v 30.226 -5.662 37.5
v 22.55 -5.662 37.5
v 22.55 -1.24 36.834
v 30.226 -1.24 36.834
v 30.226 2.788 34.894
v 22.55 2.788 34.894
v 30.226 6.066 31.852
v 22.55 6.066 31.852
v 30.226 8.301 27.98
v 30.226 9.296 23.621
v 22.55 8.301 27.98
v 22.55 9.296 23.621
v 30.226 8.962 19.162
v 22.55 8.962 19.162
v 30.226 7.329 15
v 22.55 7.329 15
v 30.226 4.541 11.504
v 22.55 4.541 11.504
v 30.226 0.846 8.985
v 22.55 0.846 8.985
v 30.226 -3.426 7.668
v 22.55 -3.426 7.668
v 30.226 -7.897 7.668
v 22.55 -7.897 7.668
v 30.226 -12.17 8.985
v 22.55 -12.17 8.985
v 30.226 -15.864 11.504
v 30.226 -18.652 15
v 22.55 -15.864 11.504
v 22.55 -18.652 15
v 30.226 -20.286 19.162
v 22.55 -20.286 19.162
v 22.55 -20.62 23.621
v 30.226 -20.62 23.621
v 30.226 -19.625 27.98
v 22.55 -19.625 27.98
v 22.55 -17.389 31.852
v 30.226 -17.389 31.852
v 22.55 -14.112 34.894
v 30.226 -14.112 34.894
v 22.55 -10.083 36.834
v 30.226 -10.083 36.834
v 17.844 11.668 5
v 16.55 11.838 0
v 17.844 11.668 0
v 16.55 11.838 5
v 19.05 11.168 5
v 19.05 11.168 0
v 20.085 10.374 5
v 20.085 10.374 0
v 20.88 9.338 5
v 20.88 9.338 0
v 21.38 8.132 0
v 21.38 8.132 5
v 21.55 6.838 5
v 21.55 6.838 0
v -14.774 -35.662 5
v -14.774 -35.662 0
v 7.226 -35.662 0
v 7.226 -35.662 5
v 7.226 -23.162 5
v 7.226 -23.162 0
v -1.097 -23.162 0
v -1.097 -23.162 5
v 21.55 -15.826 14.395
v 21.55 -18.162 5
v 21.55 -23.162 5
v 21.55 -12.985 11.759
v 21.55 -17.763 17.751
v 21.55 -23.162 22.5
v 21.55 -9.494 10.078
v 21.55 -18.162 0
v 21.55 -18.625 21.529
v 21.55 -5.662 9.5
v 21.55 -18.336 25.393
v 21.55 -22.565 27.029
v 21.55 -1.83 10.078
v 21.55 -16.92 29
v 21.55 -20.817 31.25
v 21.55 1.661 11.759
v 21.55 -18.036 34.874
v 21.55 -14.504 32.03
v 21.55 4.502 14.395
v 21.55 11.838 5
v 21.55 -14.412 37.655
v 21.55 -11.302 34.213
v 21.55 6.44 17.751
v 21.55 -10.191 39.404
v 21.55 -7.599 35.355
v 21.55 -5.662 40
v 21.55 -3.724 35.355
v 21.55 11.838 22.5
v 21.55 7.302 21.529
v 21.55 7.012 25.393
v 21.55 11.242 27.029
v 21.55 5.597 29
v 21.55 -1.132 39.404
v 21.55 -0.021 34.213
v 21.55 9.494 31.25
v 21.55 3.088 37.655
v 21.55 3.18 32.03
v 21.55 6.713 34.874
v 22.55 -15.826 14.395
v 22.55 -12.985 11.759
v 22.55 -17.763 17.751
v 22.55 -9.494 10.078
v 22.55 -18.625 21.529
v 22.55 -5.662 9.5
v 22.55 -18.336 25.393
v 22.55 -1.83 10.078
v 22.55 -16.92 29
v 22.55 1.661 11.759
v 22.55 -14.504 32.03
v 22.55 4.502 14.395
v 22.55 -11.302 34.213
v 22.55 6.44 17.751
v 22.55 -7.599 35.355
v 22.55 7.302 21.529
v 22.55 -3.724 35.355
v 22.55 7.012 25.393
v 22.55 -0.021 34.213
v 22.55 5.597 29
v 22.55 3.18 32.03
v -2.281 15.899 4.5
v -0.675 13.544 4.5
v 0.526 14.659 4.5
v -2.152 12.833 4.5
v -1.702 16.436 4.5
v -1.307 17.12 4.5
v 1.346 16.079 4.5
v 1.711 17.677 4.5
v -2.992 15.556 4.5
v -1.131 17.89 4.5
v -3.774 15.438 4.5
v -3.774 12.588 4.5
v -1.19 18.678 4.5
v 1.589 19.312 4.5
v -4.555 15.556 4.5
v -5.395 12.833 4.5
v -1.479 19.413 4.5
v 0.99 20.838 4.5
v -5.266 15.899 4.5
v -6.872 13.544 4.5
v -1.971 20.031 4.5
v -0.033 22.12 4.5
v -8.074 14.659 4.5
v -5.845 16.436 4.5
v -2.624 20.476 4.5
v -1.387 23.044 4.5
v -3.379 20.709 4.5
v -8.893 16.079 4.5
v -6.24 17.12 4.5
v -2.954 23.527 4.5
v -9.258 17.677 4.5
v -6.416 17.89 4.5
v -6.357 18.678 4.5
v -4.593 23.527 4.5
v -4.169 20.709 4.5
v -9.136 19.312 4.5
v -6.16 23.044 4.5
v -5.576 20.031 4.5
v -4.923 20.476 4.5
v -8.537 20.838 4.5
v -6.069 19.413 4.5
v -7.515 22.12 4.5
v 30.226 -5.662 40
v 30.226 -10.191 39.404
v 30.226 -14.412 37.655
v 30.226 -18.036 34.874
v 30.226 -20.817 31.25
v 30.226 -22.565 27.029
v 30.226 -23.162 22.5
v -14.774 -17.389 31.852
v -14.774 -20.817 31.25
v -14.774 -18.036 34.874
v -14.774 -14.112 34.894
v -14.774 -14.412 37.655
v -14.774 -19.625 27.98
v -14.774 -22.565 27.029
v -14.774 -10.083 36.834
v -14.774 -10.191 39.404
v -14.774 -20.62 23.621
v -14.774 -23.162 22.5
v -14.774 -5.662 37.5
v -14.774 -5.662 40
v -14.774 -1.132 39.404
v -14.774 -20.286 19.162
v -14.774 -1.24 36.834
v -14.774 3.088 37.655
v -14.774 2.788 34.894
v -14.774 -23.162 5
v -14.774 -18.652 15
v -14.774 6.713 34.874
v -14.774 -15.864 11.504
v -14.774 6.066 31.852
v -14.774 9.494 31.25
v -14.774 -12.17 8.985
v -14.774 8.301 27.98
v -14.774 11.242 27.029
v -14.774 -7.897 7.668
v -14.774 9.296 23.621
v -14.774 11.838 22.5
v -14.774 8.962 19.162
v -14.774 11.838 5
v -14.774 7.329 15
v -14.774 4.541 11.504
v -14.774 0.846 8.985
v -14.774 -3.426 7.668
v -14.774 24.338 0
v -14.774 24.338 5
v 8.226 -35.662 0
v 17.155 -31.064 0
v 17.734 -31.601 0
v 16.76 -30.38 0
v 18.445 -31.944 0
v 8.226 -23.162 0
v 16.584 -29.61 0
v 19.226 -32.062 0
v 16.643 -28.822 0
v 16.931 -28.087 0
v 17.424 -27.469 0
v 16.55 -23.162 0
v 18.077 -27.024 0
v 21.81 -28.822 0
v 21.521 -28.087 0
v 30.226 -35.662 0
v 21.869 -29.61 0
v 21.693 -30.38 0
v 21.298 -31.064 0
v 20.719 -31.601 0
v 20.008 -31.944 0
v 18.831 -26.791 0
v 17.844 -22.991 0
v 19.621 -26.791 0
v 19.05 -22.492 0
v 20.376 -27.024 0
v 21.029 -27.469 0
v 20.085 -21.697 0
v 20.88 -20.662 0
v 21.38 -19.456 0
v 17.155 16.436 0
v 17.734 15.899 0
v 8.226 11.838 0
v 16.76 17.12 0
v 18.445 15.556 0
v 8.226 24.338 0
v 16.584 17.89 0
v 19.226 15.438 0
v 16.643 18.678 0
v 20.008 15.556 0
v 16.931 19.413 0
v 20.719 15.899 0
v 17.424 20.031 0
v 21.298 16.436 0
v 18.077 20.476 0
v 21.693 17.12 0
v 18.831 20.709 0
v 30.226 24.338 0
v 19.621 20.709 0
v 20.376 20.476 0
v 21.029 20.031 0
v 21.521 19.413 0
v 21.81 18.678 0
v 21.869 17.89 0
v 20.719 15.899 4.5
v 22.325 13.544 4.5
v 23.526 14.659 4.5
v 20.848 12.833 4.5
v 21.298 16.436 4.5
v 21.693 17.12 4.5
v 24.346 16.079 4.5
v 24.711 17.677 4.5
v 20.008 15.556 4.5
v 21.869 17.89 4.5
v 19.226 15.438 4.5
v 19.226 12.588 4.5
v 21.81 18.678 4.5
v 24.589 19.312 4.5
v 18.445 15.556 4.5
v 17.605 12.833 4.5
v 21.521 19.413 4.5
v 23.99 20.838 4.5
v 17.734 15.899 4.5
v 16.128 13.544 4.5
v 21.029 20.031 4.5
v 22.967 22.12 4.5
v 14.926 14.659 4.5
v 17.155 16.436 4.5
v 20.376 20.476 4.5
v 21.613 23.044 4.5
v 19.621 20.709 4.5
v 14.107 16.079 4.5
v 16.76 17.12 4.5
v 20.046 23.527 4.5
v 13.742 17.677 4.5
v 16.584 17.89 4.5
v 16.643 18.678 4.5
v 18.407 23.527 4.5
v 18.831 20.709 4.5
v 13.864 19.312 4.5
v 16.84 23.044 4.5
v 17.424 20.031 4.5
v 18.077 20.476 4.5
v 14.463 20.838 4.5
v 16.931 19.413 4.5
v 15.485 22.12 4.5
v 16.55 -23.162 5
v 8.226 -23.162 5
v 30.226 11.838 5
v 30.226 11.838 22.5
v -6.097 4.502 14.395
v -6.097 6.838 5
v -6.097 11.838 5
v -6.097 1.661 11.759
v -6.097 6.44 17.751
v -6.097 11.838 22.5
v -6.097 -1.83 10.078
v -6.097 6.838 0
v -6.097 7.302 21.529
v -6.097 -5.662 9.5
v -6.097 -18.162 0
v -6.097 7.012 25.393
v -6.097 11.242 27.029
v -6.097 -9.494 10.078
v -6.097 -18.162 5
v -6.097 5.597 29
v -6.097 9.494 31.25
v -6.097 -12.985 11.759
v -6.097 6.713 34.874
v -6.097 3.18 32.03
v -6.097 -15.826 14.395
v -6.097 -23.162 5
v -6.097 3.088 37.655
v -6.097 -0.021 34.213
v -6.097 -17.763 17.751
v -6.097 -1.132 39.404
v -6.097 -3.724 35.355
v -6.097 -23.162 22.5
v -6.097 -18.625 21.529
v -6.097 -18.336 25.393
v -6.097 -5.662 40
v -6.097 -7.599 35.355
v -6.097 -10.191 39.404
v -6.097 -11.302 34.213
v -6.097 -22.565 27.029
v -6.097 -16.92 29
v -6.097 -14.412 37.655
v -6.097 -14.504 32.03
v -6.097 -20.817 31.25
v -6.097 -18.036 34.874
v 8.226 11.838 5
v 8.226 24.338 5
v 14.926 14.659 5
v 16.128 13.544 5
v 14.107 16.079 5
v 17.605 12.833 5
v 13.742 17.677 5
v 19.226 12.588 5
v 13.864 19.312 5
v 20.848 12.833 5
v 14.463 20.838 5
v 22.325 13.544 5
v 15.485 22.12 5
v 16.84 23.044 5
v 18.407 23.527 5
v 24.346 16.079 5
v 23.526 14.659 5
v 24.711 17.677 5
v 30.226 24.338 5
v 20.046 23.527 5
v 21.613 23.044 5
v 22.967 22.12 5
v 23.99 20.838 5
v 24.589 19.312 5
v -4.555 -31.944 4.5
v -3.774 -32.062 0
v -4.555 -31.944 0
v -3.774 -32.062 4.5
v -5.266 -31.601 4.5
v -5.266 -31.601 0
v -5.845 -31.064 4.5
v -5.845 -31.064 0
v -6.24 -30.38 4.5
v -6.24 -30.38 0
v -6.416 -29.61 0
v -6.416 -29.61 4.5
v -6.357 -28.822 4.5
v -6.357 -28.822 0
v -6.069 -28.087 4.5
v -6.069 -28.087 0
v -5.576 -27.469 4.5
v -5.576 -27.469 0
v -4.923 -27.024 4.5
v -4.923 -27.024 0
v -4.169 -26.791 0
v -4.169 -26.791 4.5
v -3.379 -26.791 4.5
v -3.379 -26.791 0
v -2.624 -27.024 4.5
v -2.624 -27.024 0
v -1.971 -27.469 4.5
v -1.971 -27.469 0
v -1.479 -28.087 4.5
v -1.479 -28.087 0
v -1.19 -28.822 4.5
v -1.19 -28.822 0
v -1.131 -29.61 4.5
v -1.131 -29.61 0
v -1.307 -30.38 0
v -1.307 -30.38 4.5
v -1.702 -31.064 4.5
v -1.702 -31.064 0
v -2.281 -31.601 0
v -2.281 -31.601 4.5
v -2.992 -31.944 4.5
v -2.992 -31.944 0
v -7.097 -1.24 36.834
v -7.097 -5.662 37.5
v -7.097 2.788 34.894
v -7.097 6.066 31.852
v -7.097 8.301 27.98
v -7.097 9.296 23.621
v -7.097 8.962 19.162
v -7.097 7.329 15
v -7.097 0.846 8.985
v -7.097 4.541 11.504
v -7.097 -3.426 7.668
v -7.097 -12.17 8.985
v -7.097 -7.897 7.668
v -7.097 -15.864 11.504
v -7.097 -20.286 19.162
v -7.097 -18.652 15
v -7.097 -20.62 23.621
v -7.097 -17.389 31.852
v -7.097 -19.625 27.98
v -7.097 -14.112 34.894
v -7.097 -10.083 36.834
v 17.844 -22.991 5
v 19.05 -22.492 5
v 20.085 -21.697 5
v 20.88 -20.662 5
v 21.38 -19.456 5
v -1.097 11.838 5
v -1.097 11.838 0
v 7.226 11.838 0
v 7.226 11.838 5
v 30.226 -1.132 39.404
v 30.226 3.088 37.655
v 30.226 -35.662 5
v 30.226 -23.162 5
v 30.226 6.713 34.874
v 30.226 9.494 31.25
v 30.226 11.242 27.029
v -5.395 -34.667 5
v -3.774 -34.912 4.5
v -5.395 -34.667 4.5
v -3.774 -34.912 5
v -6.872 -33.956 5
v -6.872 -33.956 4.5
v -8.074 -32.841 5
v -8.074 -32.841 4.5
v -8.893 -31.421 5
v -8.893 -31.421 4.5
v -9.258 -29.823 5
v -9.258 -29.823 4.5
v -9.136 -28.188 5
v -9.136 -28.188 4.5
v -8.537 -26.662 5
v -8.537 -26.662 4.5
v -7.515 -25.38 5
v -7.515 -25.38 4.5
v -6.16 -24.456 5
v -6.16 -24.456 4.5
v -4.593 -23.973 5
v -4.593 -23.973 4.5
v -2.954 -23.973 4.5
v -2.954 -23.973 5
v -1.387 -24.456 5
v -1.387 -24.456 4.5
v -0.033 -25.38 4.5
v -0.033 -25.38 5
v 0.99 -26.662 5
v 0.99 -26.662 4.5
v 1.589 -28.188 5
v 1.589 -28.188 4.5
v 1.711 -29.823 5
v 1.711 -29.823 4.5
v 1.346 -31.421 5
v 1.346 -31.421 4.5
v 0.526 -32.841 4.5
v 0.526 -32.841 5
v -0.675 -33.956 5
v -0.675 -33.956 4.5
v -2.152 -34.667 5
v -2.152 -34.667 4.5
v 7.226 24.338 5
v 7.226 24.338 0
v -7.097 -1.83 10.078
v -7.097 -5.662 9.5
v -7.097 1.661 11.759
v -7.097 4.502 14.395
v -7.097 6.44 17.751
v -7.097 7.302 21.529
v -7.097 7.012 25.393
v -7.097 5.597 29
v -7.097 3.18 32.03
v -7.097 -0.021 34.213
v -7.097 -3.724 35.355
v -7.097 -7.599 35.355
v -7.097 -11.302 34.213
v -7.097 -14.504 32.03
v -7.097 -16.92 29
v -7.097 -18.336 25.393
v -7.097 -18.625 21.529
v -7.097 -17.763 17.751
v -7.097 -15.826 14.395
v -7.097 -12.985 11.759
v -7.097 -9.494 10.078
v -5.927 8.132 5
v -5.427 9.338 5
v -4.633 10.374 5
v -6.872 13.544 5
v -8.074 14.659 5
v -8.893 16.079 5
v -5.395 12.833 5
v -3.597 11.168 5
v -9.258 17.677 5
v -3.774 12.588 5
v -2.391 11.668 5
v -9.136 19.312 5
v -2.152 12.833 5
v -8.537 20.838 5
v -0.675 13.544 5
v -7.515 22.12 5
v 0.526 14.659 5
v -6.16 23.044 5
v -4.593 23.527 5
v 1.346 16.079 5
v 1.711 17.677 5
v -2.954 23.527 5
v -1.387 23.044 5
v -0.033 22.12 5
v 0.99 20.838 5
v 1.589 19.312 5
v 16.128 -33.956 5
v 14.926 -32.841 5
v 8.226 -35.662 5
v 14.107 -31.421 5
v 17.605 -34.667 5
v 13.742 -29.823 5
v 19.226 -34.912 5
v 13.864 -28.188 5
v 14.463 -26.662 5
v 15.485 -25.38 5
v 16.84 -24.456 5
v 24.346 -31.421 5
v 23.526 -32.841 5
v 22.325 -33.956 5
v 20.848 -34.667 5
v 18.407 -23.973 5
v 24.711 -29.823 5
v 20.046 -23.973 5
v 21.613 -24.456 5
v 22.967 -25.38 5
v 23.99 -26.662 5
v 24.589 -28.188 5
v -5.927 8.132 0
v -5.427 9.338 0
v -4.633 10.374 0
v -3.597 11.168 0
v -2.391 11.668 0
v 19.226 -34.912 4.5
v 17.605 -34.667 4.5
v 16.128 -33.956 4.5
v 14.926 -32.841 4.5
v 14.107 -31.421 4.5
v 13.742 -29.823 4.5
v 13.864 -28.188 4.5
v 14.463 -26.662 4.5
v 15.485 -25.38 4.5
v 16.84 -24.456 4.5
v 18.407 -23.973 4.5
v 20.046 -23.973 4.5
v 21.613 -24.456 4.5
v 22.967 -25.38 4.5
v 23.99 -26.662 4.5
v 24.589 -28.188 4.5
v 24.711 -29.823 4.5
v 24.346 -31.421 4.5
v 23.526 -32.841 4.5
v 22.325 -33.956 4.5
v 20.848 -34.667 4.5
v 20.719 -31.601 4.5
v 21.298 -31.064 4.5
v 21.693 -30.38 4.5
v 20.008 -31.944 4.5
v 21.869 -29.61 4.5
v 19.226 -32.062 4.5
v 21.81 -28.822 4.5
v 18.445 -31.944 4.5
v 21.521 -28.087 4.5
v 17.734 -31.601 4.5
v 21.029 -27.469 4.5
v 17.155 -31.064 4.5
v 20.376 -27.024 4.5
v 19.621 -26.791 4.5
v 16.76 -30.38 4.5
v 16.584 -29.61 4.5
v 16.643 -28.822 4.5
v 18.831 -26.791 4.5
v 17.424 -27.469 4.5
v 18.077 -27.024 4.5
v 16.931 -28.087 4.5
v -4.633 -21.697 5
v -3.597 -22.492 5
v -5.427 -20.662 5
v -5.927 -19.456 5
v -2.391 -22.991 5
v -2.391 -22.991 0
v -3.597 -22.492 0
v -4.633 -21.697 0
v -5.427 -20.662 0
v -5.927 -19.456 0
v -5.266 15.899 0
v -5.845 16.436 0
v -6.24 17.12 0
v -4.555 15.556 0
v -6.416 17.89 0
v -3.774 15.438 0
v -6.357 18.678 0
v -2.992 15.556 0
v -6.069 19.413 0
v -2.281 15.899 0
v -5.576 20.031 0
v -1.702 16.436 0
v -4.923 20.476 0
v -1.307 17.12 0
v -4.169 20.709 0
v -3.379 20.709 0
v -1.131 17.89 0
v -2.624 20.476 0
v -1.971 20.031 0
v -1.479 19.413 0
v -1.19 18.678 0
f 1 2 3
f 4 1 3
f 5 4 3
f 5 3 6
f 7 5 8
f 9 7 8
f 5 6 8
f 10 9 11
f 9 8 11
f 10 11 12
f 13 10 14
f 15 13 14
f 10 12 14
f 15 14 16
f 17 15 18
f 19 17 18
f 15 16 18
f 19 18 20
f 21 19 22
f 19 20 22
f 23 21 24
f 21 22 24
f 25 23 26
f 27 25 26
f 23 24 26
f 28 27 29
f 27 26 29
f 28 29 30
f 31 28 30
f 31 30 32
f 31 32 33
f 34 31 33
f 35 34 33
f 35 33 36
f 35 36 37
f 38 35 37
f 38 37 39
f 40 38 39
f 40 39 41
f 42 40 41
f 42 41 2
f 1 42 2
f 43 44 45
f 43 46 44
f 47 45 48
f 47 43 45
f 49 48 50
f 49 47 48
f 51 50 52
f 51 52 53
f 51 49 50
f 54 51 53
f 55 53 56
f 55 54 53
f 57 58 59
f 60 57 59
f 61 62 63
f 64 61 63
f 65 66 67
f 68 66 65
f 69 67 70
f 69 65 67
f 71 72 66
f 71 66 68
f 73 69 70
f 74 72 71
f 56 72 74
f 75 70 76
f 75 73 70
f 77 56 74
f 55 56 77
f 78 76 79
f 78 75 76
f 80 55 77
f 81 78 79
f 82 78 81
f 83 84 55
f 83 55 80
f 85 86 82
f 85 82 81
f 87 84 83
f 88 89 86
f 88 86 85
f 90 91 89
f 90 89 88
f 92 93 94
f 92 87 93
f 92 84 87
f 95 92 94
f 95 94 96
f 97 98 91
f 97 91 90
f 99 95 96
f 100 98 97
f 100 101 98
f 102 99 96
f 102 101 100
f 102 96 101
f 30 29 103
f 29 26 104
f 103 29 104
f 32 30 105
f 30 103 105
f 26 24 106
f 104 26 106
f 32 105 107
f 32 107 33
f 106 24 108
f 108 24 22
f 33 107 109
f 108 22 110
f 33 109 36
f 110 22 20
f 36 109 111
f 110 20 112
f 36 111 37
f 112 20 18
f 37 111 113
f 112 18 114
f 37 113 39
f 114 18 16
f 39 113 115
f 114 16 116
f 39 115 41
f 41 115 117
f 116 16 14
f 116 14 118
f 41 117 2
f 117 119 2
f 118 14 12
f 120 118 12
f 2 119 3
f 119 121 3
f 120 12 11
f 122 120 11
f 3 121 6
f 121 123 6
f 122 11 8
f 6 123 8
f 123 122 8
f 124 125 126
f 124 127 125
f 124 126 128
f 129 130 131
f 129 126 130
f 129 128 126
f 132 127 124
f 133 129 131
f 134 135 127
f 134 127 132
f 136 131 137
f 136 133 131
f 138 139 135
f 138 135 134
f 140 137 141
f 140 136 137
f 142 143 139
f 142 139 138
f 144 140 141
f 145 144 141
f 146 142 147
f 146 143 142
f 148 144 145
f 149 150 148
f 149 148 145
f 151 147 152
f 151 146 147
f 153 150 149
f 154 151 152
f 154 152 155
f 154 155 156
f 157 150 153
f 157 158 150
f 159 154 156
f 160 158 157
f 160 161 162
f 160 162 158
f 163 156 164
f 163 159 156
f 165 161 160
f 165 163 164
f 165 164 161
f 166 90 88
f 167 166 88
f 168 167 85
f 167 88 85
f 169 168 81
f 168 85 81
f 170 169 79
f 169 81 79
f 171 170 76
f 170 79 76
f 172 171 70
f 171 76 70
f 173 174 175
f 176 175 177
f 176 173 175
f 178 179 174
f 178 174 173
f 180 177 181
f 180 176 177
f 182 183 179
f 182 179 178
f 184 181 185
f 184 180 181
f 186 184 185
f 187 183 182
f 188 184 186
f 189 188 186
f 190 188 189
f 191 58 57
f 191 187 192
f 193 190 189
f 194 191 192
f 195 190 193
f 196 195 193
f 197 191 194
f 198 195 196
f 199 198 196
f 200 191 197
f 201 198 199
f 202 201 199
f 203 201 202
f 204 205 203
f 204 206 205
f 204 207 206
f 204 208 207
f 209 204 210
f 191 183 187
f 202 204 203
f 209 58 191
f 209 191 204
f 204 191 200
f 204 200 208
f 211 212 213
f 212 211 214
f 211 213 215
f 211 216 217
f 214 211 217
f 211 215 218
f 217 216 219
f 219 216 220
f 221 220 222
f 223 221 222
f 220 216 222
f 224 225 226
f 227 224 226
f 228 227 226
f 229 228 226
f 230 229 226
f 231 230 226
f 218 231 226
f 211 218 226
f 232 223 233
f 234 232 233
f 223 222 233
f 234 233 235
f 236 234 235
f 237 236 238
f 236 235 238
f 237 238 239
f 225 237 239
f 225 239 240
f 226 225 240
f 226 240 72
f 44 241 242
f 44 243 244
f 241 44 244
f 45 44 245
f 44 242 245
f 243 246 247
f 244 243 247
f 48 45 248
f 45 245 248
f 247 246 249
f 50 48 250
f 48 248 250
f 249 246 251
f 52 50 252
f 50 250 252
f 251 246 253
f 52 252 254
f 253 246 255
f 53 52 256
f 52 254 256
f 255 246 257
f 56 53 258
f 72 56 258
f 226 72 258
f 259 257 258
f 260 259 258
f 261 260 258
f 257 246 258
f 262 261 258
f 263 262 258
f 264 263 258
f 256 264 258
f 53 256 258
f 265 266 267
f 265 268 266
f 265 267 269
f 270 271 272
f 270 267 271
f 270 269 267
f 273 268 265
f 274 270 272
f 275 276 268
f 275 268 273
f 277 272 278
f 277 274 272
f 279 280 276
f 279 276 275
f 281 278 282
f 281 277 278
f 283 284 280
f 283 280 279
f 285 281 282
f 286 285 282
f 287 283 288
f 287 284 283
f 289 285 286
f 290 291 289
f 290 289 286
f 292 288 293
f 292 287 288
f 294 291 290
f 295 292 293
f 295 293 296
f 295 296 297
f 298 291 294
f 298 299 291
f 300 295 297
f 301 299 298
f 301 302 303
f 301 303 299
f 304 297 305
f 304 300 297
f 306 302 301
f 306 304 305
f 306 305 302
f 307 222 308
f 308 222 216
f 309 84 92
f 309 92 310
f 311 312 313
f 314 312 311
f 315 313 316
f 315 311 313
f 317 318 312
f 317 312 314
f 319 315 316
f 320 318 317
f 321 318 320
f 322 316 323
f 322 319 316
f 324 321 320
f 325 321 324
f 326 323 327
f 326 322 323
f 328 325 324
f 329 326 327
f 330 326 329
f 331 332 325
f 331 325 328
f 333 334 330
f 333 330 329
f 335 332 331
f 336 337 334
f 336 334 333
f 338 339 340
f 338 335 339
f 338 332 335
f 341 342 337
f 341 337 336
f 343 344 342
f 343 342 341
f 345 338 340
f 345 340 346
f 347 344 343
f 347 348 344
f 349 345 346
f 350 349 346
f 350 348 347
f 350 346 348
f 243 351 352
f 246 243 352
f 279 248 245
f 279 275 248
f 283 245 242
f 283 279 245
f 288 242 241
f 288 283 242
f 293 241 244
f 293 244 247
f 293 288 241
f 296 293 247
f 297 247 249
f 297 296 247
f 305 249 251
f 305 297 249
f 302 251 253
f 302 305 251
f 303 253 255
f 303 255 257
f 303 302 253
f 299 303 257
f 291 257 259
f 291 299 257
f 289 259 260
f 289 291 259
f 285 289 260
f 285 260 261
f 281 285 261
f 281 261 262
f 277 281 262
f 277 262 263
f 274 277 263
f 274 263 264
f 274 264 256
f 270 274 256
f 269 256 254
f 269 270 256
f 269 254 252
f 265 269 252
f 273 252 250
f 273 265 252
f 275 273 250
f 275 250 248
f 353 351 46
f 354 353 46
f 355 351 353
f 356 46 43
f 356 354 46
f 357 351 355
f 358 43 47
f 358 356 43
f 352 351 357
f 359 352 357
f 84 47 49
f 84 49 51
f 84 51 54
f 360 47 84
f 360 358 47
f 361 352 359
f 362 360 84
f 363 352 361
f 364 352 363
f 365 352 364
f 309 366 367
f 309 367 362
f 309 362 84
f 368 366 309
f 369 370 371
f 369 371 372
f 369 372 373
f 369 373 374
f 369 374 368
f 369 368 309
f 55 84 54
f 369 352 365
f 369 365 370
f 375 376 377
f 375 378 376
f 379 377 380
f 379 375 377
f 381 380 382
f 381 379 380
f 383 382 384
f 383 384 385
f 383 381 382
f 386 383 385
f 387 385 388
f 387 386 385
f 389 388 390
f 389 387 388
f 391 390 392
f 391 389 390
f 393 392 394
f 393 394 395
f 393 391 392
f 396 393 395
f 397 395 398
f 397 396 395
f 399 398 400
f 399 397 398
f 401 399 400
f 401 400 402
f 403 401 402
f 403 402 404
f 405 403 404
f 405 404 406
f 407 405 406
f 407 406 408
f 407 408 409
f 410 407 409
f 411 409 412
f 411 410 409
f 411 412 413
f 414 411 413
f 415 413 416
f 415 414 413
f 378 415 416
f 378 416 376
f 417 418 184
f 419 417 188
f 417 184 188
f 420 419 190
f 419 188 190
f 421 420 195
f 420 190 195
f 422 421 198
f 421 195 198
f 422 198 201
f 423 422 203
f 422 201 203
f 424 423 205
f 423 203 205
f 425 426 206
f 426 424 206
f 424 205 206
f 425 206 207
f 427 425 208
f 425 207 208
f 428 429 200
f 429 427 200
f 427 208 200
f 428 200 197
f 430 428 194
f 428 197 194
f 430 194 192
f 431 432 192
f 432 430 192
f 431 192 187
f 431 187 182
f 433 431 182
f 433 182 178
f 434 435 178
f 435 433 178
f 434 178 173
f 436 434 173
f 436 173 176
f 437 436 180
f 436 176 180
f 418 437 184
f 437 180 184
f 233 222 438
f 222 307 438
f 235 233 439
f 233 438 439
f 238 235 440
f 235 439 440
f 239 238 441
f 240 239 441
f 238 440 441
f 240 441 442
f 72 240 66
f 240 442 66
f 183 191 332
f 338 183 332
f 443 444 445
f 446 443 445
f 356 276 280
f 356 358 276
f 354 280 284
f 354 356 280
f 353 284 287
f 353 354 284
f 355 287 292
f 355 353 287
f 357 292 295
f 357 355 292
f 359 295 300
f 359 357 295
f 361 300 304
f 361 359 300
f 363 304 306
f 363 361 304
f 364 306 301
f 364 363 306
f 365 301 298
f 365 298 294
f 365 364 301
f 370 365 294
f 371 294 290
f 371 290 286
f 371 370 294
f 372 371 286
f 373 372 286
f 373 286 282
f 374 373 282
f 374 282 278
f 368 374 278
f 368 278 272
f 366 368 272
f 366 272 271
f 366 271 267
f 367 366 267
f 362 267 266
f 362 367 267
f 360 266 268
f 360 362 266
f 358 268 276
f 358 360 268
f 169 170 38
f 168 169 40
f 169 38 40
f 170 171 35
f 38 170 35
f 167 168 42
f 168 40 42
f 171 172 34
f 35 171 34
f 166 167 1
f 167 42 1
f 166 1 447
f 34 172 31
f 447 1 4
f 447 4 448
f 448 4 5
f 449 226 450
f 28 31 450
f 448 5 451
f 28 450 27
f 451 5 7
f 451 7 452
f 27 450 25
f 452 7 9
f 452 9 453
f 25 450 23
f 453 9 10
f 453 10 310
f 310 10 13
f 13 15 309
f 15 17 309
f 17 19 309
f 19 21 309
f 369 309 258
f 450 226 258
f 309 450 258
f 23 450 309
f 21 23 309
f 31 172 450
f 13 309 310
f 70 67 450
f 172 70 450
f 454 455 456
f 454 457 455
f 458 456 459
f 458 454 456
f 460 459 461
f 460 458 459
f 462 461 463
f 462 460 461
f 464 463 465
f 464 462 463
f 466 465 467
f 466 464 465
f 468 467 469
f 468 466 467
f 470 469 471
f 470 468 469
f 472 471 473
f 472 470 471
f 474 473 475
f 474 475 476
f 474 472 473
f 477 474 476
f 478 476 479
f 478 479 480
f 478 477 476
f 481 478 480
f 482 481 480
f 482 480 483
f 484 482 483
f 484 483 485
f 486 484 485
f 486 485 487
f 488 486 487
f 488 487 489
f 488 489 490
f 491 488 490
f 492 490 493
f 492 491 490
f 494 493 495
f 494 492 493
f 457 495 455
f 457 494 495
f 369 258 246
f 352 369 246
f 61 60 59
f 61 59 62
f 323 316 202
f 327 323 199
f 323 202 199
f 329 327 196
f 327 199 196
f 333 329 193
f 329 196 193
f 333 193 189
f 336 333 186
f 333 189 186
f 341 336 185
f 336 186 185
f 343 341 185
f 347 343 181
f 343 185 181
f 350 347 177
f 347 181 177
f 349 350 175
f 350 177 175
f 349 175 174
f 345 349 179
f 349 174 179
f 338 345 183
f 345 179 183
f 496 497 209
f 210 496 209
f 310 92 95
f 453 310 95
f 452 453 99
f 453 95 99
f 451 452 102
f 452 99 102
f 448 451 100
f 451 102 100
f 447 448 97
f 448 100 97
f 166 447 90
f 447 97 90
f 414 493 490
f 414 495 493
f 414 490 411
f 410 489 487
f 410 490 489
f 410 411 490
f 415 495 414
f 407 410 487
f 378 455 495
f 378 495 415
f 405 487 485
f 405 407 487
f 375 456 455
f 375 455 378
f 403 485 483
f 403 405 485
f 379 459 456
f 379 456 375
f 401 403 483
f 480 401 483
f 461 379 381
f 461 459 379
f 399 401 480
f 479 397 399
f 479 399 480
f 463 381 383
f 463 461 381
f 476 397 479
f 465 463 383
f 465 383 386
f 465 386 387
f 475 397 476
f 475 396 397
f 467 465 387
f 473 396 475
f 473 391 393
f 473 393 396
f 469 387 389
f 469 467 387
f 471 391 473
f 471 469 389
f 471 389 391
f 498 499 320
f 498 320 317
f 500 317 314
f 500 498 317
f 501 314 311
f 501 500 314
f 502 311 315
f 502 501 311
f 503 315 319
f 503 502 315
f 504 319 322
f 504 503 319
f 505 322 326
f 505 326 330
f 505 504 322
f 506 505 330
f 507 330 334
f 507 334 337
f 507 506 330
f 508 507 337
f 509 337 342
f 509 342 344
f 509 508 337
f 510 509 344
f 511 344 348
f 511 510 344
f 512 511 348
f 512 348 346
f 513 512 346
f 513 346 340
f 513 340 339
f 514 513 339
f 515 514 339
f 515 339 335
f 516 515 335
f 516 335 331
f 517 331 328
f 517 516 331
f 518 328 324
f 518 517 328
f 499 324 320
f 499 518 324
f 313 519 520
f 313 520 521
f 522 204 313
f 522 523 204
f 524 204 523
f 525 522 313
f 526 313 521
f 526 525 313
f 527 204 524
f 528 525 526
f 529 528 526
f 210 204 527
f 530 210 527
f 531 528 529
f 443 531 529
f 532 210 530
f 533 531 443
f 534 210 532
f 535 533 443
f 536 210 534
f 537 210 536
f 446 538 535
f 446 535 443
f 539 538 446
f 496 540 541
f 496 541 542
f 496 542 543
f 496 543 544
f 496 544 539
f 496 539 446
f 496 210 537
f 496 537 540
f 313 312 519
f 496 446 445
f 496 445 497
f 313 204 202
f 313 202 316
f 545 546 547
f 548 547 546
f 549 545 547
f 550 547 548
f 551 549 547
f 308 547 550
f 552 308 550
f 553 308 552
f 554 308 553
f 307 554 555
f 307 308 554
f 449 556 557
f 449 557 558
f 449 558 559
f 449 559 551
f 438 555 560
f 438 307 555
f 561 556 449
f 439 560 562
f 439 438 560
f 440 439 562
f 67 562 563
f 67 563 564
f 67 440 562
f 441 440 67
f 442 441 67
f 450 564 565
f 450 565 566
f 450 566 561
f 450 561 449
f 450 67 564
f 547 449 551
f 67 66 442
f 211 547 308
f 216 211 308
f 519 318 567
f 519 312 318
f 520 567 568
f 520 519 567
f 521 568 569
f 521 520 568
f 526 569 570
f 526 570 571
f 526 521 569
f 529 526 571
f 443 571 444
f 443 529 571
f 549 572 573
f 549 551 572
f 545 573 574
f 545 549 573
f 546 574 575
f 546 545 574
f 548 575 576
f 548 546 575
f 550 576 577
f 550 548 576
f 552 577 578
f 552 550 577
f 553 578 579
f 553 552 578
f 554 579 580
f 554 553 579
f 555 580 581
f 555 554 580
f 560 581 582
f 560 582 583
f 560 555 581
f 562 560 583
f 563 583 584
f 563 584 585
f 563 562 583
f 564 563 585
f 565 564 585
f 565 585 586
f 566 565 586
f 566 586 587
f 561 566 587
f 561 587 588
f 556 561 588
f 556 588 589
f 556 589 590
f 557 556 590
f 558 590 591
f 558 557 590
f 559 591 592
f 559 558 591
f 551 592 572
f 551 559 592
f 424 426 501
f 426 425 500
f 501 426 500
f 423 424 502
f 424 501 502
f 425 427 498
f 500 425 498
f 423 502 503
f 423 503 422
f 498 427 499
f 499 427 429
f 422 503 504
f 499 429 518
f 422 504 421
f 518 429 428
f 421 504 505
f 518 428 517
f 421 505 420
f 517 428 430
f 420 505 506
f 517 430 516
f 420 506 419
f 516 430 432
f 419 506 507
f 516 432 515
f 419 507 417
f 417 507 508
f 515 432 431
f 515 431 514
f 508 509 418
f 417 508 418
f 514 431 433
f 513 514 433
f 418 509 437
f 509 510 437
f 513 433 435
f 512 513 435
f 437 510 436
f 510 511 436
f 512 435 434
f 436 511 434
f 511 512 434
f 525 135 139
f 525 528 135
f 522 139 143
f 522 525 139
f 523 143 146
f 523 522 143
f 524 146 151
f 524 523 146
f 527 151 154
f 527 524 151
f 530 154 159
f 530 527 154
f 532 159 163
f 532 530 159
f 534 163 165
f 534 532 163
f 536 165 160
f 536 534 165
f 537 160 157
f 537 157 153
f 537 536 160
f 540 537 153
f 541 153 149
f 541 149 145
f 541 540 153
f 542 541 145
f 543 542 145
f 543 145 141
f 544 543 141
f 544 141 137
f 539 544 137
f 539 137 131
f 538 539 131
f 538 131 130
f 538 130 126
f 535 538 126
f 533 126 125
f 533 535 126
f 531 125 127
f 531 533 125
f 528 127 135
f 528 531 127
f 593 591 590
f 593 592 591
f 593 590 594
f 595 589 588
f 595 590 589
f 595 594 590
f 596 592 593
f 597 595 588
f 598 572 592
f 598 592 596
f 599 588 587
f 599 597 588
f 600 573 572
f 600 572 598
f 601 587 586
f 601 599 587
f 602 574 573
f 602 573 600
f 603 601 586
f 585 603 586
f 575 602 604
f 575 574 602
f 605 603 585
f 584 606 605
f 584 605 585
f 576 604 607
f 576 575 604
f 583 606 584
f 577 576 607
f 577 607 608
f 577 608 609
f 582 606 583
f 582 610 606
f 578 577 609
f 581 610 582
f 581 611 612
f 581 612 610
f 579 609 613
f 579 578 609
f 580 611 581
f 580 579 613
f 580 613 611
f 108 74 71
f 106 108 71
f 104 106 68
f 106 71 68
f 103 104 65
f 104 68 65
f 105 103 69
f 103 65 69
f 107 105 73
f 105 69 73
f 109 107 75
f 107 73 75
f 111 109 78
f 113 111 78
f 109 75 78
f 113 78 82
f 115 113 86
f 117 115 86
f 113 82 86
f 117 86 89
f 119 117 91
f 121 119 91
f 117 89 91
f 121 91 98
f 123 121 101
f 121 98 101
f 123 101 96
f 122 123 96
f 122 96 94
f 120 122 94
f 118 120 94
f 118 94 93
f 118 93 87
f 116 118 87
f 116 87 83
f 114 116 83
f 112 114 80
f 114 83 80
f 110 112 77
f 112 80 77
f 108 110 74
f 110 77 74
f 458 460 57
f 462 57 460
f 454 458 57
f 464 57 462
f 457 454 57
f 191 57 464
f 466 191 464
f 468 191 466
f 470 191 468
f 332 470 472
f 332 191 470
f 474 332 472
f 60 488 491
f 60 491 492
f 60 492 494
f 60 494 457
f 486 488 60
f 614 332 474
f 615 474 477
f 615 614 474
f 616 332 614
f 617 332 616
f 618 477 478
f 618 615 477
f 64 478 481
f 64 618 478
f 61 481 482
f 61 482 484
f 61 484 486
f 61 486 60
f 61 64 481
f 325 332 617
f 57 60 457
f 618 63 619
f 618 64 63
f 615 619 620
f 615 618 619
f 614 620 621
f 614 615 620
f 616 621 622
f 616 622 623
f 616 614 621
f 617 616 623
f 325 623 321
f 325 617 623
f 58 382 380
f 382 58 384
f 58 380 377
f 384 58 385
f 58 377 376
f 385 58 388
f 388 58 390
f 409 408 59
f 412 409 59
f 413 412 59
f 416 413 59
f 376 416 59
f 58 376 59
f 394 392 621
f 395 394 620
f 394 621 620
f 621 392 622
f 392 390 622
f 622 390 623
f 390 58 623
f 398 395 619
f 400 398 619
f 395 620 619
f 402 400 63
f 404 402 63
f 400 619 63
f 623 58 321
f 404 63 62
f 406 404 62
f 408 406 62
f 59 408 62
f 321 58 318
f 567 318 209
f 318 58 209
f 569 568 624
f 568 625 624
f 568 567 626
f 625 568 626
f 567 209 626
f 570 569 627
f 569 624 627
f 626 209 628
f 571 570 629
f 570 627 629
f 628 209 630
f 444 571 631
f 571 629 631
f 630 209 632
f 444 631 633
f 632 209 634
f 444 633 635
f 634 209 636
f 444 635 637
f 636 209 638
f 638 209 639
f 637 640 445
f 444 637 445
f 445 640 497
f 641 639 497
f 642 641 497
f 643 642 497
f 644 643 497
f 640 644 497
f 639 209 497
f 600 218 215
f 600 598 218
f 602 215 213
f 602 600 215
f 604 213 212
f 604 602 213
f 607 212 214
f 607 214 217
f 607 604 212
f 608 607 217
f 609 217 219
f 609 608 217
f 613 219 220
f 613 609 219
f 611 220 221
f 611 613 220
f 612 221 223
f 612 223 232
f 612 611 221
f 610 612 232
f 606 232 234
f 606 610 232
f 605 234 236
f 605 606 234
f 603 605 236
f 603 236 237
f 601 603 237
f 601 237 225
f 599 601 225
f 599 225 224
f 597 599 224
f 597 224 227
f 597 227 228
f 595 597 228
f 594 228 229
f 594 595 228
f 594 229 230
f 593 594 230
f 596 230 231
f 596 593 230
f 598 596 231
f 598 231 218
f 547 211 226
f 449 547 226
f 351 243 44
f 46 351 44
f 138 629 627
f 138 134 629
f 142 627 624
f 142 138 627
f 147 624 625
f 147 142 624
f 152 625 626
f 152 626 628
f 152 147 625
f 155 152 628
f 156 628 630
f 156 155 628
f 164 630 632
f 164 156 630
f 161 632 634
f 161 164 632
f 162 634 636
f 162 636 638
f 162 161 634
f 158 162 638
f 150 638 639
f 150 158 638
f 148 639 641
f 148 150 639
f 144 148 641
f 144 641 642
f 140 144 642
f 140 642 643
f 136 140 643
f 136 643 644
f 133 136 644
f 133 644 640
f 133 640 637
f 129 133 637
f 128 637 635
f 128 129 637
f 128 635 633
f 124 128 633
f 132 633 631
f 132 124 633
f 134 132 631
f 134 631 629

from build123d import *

# Parameters (mm, degrees)
EXTRUDE_2_DEPTH          = 5
SKETCH_4_W               = 8.676470589
SKETCH_4_H               = 35
SKETCH_4_W_2             = 8.676470588
EXTRUDE_15_DEPTH         = 35
CUT_EXTRUDE_1_DEPTH      = 45
SKETCH_6_R               = 15
CUT_EXTRUDE_2_DEPTH      = 45
FILLET_1_R               = 5
EXTRUDE_START            = -1
SKETCH_7_R               = 15
SKETCH_7_R_2             = 13
EXTRUDE_16_DEPTH         = 1
SKETCH_8_R               = 15
SKETCH_8_R_2             = 13
EXTRUDE_17_DEPTH         = 1
SKETCH_9_W               = 1
SKETCH_9_H               = 12.5
CUT_EXTRUDE_3_DEPTH      = 5
HOLE_WIZARD_1_AT_2_COUNT = 2
HOLE_WIZARD_1_AT_2_PITCH = 23
HOLE_WIZARD_1_AT_3_COUNT = 2
HOLE_WIZARD_1_AT_3_PITCH = 47.5
HOLE_WIZARD_1_AT_4_COUNT = 2
HOLE_WIZARD_1_AT_4_PITCH = 52.775467786


with BuildPart() as part:
    # 草图2 → 凸台-拉伸2 (new body)
    with BuildSketch(Plane.XY):
        Polygon((7.726423565, 24.338235294), (-14.773576435, 24.338235294), (-14.773576435, -35.661764706), (7.726423565, -35.661764706), (7.726423565, -23.161764706), (-6.097105846, -23.161764706), (-6.097105846, 11.838235294), (7.726423565, 11.838235294), align=None)
        Polygon((30.226423565, 24.338235294), (7.726423565, 24.338235294), (7.726423565, 11.838235294), (21.549952977, 11.838235294), (21.549952977, -23.161764706), (7.726423565, -23.161764706), (7.726423565, -35.661764706), (30.226423565, -35.661764706), align=None)
    extrude(amount=EXTRUDE_2_DEPTH)

    # 草图4 → 凸台-拉伸15 (add)
    with BuildSketch(Plane.XY.offset(5)):
        with Locations((-10.435341141, -5.661764706)):
            Rectangle(SKETCH_4_W, SKETCH_4_H)
        with Locations((25.888188271, -5.661764706)):
            Rectangle(SKETCH_4_W_2, SKETCH_4_H)
    extrude(amount=EXTRUDE_15_DEPTH)

    # 草图5 → 切除-拉伸1 (cut)
    with BuildSketch(Plane.ZY.offset(14.773576435)):
        with BuildLine():
            Line((40, -23.161764706), (40, -5.661764706))
            ThreePointArc((40, -5.661764706), (34.874368671, -18.036133377), (22.5, -23.161764706))
            Line((22.5, -23.161764706), (40, -23.161764706))
        make_face()
        with BuildLine():
            ThreePointArc((22.5, 11.838235294), (34.874368671, 6.712603965), (40, -5.661764706))
            Line((40, -5.661764706), (40, 11.838235294))
            Line((40, 11.838235294), (22.5, 11.838235294))
        make_face()
    extrude(amount=-CUT_EXTRUDE_1_DEPTH, mode=Mode.SUBTRACT)

    # 草图6 → 切除-拉伸2 (cut)
    with BuildSketch(Plane.ZY.offset(14.773576435)):
        with Locations((22.5, -5.661764706)):
            Circle(SKETCH_6_R)
    extrude(amount=-CUT_EXTRUDE_2_DEPTH, mode=Mode.SUBTRACT)

    # 圆角1
    fillet_1_edges = [part.edges().sort_by_distance(p)[0] for p in [
        (-6.097105846, 11.838235294, 2.5),
        (-6.097105846, -23.161764706, 2.5),
        (21.549952977, -23.161764706, 2.5),
        (21.549952977, 11.838235294, 2.5),
    ]]
    fillet(fillet_1_edges, radius=FILLET_1_R)

    # 草图7 → 凸台-拉伸16 (add)
    with BuildSketch(Plane(origin=(-6.097105846, 0, 0), x_dir=(0, 0, -1), z_dir=(1, 0, 0)).offset(EXTRUDE_START)):
        with Locations(Location((-22.5, -5.661764706, 0), (0, 0, 180))):
            Circle(SKETCH_7_R)
        with Locations((-22.5, -5.661764706)):
            Circle(SKETCH_7_R_2, mode=Mode.SUBTRACT)
    extrude(amount=EXTRUDE_16_DEPTH)

    # 草图8 → 凸台-拉伸17 (add)
    with BuildSketch(Plane.ZY.offset(-21.549952977)):
        with Locations((22.5, -5.661764706)):
            Circle(SKETCH_8_R)
        with Locations(Location((22.5, -5.661764706, 0), (0, 0, 180))):
            Circle(SKETCH_8_R_2, mode=Mode.SUBTRACT)
    extrude(amount=-EXTRUDE_17_DEPTH)

    # 草图9 → 切除-拉伸3 (cut)
    with BuildSketch(Plane.XY.offset(5)):
        with Locations((7.726423565, 18.088235294)):
            Rectangle(SKETCH_9_W, SKETCH_9_H)
        with Locations((7.726423565, -29.411764706)):
            Rectangle(SKETCH_9_W, SKETCH_9_H)
    extrude(amount=-CUT_EXTRUDE_3_DEPTH, mode=Mode.SUBTRACT)


with BuildPart() as cut_extrude_3_piece_1:
    # of the separate pieces the step leaves, piece 1, a body of its own (cut_extrude_3_pieces)
    add(part.part.solids().sort_by_distance((16.549952977, 11.838235294, 5))[0])


with BuildPart() as cut_extrude_3_piece_2:
    # of the separate pieces the step leaves, piece 2, a body of its own (cut_extrude_3_pieces)
    add(part.part.solids().sort_by_distance((7.226423565, 11.838235294, 5))[0])

    # 草图13 → 打孔尺寸(%根据六角头螺)栓 全螺纹的类型1 (revolve, cut)
    with BuildSketch(Plane(origin=(-3.773576435, 18.088235294, 5), x_dir=(0, -1, 0), z_dir=(1, 0, 0))):
        Polygon((0, 0), (0, 6.59228064), (2.65, 5), (2.65, 0.5), (5.5, 0.5), (5.5, 0), align=None)
    hole_wizard_1 = revolve(axis=Axis((-3.773576435, 18.088235294, 11.35), (0, 0, -1)), mode=Mode.SUBTRACT)

    # 打孔尺寸(%根据六角头螺)栓 全螺纹的类型1 at 3: 打孔尺寸(%根据六角头螺)栓 全螺纹的类型1 ×2
    with Locations(*[(0, -i * HOLE_WIZARD_1_AT_3_PITCH, 0) for i in range(1, HOLE_WIZARD_1_AT_3_COUNT)]):
        add(hole_wizard_1, mode=Mode.SUBTRACT)


with BuildPart() as cut_extrude_3_piece_1_1:
    add(cut_extrude_3_piece_1.part)

    # 打孔尺寸(%根据六角头螺)栓 全螺纹的类型1 at 2: 打孔尺寸(%根据六角头螺)栓 全螺纹的类型1 ×2
    with Locations(*[(i * HOLE_WIZARD_1_AT_2_PITCH, 0, 0) for i in range(1, HOLE_WIZARD_1_AT_2_COUNT)]):
        add(hole_wizard_1, mode=Mode.SUBTRACT)

    # 打孔尺寸(%根据六角头螺)栓 全螺纹的类型1 at 4: 打孔尺寸(%根据六角头螺)栓 全螺纹的类型1 ×2
    with Locations(*[Vector(0.43580854827079, -0.900039393167936, 0) * (i * HOLE_WIZARD_1_AT_4_PITCH) for i in range(1, HOLE_WIZARD_1_AT_4_COUNT)]):
        add(hole_wizard_1, mode=Mode.SUBTRACT)


solid = Compound([cut_extrude_3_piece_2.part, cut_extrude_3_piece_1_1.part])
